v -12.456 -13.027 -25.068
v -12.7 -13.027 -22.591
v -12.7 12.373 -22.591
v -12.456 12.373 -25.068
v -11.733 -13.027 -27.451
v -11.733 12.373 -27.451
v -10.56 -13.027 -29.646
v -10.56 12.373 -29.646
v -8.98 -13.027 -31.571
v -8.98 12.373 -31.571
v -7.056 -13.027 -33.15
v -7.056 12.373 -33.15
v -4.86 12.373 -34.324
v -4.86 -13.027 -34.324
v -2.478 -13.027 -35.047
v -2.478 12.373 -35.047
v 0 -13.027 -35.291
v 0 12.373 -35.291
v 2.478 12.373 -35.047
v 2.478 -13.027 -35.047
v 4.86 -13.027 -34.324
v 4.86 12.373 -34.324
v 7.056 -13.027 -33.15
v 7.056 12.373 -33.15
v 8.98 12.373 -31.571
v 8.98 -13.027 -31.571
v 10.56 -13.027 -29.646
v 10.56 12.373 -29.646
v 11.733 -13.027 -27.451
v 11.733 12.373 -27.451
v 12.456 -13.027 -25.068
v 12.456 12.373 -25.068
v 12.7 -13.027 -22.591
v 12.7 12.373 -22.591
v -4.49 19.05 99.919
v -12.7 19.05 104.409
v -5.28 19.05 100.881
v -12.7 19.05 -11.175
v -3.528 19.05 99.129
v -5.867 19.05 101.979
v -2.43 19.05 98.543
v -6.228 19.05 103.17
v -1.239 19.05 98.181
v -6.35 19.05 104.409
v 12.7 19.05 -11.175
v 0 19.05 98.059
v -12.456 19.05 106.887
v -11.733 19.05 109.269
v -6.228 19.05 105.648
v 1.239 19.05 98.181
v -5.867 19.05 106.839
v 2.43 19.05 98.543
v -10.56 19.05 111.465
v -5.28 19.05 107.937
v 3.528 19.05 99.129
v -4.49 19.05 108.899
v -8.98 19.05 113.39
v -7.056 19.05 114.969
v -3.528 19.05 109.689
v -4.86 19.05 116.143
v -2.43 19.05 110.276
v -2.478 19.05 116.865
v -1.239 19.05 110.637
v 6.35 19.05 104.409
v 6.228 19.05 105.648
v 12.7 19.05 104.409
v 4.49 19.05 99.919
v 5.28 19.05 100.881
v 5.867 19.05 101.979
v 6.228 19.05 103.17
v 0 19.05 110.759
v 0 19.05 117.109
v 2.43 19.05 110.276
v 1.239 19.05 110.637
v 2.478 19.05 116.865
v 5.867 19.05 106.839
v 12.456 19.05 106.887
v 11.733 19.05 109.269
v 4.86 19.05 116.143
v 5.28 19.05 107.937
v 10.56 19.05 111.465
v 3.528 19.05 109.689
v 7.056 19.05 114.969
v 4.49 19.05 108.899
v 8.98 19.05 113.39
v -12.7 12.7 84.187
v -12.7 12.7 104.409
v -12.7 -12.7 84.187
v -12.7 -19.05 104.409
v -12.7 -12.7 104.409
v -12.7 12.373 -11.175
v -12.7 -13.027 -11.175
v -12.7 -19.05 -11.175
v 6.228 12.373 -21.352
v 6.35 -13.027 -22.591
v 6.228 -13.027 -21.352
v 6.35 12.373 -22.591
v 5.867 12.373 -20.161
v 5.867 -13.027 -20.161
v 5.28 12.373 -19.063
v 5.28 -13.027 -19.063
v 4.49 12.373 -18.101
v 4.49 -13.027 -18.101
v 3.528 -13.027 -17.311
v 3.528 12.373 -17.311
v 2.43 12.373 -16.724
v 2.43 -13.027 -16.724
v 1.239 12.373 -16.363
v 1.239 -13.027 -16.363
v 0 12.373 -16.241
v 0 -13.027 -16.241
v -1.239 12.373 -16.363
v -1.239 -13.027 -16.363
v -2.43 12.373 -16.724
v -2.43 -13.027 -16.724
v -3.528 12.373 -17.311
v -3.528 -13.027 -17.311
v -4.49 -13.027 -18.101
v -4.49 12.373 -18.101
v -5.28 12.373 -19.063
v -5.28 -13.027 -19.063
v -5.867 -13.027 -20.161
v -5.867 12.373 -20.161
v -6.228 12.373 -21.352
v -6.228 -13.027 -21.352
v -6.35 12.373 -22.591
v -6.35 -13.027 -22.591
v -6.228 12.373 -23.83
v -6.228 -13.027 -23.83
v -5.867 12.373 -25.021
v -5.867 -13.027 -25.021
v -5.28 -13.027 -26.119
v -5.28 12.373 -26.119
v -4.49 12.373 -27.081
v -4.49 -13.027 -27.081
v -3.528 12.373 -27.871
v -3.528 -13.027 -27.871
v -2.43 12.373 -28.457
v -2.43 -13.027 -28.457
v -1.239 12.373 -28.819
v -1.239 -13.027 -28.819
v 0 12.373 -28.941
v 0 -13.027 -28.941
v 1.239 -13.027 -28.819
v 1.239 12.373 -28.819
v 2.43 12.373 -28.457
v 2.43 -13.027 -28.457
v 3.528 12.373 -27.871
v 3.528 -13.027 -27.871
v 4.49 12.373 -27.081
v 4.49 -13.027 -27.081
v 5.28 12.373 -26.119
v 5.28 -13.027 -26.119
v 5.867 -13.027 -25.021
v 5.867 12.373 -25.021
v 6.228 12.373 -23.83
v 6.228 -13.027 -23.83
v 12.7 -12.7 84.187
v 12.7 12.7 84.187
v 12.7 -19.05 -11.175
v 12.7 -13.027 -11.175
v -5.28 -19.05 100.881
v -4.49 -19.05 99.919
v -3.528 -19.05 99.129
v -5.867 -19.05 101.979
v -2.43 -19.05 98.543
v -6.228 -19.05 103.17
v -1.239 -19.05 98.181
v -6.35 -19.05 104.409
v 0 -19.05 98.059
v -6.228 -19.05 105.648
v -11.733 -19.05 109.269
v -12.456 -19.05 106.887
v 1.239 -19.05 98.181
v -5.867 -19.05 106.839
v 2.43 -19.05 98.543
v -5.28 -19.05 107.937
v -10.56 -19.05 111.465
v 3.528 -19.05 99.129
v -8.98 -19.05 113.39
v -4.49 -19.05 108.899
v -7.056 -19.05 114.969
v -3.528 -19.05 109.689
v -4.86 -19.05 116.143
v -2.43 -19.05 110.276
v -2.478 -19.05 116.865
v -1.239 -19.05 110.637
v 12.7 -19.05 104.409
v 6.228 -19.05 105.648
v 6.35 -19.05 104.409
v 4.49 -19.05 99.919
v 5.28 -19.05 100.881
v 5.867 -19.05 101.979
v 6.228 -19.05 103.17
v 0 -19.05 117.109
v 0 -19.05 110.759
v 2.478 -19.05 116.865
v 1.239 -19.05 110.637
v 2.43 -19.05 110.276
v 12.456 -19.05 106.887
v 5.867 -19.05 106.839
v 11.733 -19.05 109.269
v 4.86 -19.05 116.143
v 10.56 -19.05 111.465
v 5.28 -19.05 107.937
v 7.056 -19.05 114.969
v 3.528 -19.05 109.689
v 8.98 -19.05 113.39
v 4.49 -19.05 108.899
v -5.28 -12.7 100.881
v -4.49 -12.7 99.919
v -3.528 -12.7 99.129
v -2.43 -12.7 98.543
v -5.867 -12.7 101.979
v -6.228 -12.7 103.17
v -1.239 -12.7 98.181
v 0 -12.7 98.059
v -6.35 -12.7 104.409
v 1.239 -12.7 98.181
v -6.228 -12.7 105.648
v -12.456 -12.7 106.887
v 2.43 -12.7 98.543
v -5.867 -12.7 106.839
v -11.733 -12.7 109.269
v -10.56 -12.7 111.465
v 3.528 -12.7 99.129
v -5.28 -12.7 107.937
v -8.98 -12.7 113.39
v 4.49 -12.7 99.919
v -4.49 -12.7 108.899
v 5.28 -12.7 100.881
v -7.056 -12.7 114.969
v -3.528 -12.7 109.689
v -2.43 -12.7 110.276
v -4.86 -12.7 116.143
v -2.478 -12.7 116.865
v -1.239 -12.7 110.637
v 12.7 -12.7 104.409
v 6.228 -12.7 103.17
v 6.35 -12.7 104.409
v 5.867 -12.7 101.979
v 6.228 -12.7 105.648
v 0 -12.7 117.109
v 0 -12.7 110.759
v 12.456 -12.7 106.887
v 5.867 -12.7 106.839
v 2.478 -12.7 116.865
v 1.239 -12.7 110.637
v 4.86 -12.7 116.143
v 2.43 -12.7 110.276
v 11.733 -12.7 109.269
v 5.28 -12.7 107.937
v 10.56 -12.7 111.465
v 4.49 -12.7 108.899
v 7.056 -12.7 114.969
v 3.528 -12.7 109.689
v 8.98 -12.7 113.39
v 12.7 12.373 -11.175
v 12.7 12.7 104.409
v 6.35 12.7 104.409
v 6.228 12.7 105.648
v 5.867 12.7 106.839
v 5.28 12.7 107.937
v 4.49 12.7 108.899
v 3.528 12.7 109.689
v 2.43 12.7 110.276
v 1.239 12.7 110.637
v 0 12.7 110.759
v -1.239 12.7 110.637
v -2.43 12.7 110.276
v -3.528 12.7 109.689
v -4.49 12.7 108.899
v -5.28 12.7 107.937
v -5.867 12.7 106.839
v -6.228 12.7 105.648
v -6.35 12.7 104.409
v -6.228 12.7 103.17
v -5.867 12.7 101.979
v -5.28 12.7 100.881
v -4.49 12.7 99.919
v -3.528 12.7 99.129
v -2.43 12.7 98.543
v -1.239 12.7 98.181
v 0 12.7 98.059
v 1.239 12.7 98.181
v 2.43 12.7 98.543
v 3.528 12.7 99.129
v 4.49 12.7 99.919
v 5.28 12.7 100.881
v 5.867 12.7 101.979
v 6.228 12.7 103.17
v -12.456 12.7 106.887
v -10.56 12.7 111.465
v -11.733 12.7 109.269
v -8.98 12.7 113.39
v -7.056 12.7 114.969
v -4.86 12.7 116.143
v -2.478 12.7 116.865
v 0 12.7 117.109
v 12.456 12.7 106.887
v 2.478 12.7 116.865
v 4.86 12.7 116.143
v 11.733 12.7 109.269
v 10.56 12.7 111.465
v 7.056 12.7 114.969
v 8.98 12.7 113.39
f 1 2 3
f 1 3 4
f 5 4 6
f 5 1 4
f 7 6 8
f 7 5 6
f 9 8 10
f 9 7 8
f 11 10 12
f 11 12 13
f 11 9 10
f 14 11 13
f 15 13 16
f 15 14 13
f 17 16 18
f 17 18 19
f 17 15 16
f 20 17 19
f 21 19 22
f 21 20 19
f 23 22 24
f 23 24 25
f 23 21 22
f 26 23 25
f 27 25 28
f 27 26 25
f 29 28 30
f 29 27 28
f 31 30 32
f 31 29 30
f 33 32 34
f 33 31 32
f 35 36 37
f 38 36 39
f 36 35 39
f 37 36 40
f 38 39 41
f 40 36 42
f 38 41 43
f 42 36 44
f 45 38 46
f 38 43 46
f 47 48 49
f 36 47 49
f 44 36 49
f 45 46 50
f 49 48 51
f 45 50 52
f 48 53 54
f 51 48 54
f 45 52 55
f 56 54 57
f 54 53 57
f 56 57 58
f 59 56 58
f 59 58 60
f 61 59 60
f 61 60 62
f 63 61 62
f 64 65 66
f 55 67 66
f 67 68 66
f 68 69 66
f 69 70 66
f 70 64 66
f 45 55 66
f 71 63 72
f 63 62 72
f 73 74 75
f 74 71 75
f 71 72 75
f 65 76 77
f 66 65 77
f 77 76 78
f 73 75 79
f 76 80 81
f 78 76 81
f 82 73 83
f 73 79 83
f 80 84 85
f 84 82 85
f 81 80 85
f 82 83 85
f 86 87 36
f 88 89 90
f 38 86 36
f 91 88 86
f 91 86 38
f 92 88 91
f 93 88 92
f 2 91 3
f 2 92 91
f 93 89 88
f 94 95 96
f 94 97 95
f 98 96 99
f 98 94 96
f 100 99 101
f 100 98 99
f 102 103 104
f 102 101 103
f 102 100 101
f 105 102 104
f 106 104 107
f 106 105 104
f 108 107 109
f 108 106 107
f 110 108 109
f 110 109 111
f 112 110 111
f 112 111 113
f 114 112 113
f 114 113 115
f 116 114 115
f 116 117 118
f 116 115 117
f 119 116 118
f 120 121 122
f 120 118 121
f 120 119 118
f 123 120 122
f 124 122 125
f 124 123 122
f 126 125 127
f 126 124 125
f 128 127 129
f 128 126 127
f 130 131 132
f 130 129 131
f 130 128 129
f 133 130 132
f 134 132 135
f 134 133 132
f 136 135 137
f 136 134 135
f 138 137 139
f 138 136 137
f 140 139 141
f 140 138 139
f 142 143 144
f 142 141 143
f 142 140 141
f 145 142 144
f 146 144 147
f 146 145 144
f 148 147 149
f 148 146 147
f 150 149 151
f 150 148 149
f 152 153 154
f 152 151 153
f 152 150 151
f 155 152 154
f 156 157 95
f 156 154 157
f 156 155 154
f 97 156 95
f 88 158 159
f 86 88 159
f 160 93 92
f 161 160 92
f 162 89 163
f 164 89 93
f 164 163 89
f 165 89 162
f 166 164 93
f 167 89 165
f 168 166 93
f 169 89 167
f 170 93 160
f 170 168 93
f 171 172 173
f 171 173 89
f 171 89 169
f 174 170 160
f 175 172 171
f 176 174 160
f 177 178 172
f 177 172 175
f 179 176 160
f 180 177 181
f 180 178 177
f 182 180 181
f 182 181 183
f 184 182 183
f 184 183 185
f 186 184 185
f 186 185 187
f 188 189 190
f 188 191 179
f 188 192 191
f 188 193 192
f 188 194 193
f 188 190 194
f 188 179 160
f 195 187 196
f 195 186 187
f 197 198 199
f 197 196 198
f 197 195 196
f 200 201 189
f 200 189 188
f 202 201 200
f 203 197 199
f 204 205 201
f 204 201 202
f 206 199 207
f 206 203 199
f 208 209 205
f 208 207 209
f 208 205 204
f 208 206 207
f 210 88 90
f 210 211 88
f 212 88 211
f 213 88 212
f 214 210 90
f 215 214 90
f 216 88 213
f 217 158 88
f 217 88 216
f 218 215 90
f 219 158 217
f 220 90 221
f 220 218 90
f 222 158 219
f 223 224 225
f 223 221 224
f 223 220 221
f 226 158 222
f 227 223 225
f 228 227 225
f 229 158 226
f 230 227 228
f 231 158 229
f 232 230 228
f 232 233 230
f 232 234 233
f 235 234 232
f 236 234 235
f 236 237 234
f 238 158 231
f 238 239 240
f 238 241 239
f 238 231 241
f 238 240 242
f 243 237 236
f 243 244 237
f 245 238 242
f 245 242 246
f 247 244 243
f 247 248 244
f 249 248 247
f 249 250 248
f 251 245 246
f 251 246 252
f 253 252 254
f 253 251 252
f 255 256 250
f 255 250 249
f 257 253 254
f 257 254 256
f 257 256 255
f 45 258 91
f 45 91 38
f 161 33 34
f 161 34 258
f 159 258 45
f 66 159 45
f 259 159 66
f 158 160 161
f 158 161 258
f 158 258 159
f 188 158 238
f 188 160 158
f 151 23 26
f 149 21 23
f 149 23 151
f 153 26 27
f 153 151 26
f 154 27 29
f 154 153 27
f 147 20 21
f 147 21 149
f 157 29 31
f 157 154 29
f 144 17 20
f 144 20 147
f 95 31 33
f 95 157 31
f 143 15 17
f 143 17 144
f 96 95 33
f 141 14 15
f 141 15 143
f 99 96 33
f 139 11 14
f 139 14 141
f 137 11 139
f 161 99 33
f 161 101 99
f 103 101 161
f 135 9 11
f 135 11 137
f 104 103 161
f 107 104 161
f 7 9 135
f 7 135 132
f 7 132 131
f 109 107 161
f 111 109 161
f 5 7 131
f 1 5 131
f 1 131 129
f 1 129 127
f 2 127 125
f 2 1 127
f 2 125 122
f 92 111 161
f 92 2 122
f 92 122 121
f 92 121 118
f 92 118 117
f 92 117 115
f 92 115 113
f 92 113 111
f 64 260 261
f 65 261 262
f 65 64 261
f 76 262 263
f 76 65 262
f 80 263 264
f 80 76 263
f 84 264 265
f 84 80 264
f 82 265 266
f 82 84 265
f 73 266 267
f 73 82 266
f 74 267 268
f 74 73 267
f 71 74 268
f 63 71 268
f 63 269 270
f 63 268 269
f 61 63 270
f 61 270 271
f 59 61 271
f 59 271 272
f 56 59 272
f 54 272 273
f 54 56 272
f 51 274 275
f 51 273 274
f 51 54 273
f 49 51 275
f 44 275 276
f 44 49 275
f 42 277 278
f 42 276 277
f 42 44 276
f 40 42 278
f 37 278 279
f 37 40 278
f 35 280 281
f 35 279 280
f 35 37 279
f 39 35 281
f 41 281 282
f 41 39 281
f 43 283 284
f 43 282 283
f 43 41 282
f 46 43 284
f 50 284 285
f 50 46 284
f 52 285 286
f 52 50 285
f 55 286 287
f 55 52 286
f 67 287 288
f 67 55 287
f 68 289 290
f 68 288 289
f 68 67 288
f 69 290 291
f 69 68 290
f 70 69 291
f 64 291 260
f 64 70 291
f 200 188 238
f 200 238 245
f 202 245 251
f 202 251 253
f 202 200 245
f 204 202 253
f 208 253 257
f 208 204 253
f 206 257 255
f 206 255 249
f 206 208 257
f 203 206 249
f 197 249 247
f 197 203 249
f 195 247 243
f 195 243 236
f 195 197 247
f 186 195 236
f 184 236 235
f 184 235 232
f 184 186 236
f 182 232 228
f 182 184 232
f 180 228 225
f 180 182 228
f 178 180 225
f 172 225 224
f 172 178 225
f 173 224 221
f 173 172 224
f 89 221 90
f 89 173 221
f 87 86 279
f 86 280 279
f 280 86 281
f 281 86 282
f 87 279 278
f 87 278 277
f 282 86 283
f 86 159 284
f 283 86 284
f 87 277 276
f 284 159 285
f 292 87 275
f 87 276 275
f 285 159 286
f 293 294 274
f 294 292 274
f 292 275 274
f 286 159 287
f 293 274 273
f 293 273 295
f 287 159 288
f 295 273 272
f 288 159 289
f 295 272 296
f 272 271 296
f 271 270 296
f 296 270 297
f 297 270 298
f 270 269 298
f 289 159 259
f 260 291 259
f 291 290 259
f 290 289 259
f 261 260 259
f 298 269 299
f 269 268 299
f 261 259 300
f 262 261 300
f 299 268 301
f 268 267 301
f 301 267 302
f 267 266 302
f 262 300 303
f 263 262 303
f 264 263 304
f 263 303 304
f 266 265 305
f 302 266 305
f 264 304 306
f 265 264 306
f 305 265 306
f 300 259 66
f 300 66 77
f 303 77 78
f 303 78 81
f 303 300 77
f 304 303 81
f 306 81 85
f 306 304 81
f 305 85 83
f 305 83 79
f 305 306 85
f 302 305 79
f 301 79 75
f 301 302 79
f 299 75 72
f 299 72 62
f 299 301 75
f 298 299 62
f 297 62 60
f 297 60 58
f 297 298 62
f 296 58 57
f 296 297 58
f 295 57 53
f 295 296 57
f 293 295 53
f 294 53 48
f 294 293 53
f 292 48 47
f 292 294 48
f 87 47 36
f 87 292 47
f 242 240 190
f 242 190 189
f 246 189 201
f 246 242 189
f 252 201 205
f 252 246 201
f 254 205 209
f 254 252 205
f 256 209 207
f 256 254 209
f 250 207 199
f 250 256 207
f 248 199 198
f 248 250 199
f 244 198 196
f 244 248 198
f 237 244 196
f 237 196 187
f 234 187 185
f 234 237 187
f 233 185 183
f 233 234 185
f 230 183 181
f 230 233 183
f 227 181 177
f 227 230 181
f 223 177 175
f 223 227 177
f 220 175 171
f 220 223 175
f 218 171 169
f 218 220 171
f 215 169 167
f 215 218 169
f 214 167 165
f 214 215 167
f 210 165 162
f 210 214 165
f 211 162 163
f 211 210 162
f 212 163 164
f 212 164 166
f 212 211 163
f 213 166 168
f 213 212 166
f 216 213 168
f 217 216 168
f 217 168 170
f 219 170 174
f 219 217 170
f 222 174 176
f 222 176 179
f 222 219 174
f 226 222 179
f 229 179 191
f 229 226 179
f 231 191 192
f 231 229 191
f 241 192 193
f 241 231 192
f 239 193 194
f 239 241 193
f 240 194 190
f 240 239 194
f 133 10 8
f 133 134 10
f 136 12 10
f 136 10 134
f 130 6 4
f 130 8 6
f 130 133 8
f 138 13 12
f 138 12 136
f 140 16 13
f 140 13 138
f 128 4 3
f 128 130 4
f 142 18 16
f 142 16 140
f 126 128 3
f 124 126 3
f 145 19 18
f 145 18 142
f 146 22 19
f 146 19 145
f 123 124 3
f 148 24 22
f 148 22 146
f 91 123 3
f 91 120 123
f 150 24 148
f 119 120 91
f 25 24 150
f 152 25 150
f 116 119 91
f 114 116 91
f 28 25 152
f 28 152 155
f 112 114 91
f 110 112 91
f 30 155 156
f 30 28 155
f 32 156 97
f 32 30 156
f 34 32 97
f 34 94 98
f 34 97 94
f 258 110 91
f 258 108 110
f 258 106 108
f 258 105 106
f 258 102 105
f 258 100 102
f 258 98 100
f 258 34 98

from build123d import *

# Parameters (mm, degrees)
F0_R     = 6.35
F1_DEPTH = 19.05
F2_W     = 25.4
F2_H     = 38.1
F3_DEPTH = 12.7
F4_W     = 7.62
F4_H     = 25.4
F5_DEPTH = 12.7


with BuildPart() as f1:
    # F0 (on Front) → F1 (new body, symmetric)
    with BuildSketch(Plane.XZ):
        with BuildLine():
            ThreePointArc((-12.7, 104.409303), (0, 91.709303), (12.7, 104.409303))
            ThreePointArc((12.7, 104.409303), (0, 117.109303), (-12.7, 104.409303))
        make_face()
        with Locations((0, 104.409303)):
            Circle(F0_R, mode=Mode.SUBTRACT)
        with BuildLine():
            Line((12.7, -22.590697), (12.7, 104.409303))
            ThreePointArc((12.7, 104.409303), (0, 91.709303), (-12.7, 104.409303))
            Line((-12.7, 104.409303), (-12.7, -22.590697))
            ThreePointArc((-12.7, -22.590697), (0, -9.890697), (12.7, -22.590697))
        make_face()
        with BuildLine():
            ThreePointArc((-12.7, -22.590697), (0, -35.290697), (12.7, -22.590697))
            ThreePointArc((12.7, -22.590697), (0, -9.890697), (-12.7, -22.590697))
        make_face()
        with Locations((0, -22.590697)):
            Circle(F0_R, mode=Mode.SUBTRACT)
    extrude(amount=F1_DEPTH, both=True)

    # F2 (on Right) → F3 (cut, symmetric)
    with BuildSketch(Plane.YZ):
        with Locations((0, 103.236585)):
            Rectangle(F2_W, F2_H)
    extrude(amount=F3_DEPTH, both=True, mode=Mode.SUBTRACT)

    # F4 (on Right) → F5 (cut, symmetric)
    with BuildSketch(Plane.YZ):
        with Locations((-16.837219, -23.87516)):
            Rectangle(F4_W, F4_H)
        with Locations((16.182781, -23.87516)):
            Rectangle(F4_W, F4_H)
    extrude(amount=F5_DEPTH, both=True, mode=Mode.SUBTRACT)


solid = f1.part
